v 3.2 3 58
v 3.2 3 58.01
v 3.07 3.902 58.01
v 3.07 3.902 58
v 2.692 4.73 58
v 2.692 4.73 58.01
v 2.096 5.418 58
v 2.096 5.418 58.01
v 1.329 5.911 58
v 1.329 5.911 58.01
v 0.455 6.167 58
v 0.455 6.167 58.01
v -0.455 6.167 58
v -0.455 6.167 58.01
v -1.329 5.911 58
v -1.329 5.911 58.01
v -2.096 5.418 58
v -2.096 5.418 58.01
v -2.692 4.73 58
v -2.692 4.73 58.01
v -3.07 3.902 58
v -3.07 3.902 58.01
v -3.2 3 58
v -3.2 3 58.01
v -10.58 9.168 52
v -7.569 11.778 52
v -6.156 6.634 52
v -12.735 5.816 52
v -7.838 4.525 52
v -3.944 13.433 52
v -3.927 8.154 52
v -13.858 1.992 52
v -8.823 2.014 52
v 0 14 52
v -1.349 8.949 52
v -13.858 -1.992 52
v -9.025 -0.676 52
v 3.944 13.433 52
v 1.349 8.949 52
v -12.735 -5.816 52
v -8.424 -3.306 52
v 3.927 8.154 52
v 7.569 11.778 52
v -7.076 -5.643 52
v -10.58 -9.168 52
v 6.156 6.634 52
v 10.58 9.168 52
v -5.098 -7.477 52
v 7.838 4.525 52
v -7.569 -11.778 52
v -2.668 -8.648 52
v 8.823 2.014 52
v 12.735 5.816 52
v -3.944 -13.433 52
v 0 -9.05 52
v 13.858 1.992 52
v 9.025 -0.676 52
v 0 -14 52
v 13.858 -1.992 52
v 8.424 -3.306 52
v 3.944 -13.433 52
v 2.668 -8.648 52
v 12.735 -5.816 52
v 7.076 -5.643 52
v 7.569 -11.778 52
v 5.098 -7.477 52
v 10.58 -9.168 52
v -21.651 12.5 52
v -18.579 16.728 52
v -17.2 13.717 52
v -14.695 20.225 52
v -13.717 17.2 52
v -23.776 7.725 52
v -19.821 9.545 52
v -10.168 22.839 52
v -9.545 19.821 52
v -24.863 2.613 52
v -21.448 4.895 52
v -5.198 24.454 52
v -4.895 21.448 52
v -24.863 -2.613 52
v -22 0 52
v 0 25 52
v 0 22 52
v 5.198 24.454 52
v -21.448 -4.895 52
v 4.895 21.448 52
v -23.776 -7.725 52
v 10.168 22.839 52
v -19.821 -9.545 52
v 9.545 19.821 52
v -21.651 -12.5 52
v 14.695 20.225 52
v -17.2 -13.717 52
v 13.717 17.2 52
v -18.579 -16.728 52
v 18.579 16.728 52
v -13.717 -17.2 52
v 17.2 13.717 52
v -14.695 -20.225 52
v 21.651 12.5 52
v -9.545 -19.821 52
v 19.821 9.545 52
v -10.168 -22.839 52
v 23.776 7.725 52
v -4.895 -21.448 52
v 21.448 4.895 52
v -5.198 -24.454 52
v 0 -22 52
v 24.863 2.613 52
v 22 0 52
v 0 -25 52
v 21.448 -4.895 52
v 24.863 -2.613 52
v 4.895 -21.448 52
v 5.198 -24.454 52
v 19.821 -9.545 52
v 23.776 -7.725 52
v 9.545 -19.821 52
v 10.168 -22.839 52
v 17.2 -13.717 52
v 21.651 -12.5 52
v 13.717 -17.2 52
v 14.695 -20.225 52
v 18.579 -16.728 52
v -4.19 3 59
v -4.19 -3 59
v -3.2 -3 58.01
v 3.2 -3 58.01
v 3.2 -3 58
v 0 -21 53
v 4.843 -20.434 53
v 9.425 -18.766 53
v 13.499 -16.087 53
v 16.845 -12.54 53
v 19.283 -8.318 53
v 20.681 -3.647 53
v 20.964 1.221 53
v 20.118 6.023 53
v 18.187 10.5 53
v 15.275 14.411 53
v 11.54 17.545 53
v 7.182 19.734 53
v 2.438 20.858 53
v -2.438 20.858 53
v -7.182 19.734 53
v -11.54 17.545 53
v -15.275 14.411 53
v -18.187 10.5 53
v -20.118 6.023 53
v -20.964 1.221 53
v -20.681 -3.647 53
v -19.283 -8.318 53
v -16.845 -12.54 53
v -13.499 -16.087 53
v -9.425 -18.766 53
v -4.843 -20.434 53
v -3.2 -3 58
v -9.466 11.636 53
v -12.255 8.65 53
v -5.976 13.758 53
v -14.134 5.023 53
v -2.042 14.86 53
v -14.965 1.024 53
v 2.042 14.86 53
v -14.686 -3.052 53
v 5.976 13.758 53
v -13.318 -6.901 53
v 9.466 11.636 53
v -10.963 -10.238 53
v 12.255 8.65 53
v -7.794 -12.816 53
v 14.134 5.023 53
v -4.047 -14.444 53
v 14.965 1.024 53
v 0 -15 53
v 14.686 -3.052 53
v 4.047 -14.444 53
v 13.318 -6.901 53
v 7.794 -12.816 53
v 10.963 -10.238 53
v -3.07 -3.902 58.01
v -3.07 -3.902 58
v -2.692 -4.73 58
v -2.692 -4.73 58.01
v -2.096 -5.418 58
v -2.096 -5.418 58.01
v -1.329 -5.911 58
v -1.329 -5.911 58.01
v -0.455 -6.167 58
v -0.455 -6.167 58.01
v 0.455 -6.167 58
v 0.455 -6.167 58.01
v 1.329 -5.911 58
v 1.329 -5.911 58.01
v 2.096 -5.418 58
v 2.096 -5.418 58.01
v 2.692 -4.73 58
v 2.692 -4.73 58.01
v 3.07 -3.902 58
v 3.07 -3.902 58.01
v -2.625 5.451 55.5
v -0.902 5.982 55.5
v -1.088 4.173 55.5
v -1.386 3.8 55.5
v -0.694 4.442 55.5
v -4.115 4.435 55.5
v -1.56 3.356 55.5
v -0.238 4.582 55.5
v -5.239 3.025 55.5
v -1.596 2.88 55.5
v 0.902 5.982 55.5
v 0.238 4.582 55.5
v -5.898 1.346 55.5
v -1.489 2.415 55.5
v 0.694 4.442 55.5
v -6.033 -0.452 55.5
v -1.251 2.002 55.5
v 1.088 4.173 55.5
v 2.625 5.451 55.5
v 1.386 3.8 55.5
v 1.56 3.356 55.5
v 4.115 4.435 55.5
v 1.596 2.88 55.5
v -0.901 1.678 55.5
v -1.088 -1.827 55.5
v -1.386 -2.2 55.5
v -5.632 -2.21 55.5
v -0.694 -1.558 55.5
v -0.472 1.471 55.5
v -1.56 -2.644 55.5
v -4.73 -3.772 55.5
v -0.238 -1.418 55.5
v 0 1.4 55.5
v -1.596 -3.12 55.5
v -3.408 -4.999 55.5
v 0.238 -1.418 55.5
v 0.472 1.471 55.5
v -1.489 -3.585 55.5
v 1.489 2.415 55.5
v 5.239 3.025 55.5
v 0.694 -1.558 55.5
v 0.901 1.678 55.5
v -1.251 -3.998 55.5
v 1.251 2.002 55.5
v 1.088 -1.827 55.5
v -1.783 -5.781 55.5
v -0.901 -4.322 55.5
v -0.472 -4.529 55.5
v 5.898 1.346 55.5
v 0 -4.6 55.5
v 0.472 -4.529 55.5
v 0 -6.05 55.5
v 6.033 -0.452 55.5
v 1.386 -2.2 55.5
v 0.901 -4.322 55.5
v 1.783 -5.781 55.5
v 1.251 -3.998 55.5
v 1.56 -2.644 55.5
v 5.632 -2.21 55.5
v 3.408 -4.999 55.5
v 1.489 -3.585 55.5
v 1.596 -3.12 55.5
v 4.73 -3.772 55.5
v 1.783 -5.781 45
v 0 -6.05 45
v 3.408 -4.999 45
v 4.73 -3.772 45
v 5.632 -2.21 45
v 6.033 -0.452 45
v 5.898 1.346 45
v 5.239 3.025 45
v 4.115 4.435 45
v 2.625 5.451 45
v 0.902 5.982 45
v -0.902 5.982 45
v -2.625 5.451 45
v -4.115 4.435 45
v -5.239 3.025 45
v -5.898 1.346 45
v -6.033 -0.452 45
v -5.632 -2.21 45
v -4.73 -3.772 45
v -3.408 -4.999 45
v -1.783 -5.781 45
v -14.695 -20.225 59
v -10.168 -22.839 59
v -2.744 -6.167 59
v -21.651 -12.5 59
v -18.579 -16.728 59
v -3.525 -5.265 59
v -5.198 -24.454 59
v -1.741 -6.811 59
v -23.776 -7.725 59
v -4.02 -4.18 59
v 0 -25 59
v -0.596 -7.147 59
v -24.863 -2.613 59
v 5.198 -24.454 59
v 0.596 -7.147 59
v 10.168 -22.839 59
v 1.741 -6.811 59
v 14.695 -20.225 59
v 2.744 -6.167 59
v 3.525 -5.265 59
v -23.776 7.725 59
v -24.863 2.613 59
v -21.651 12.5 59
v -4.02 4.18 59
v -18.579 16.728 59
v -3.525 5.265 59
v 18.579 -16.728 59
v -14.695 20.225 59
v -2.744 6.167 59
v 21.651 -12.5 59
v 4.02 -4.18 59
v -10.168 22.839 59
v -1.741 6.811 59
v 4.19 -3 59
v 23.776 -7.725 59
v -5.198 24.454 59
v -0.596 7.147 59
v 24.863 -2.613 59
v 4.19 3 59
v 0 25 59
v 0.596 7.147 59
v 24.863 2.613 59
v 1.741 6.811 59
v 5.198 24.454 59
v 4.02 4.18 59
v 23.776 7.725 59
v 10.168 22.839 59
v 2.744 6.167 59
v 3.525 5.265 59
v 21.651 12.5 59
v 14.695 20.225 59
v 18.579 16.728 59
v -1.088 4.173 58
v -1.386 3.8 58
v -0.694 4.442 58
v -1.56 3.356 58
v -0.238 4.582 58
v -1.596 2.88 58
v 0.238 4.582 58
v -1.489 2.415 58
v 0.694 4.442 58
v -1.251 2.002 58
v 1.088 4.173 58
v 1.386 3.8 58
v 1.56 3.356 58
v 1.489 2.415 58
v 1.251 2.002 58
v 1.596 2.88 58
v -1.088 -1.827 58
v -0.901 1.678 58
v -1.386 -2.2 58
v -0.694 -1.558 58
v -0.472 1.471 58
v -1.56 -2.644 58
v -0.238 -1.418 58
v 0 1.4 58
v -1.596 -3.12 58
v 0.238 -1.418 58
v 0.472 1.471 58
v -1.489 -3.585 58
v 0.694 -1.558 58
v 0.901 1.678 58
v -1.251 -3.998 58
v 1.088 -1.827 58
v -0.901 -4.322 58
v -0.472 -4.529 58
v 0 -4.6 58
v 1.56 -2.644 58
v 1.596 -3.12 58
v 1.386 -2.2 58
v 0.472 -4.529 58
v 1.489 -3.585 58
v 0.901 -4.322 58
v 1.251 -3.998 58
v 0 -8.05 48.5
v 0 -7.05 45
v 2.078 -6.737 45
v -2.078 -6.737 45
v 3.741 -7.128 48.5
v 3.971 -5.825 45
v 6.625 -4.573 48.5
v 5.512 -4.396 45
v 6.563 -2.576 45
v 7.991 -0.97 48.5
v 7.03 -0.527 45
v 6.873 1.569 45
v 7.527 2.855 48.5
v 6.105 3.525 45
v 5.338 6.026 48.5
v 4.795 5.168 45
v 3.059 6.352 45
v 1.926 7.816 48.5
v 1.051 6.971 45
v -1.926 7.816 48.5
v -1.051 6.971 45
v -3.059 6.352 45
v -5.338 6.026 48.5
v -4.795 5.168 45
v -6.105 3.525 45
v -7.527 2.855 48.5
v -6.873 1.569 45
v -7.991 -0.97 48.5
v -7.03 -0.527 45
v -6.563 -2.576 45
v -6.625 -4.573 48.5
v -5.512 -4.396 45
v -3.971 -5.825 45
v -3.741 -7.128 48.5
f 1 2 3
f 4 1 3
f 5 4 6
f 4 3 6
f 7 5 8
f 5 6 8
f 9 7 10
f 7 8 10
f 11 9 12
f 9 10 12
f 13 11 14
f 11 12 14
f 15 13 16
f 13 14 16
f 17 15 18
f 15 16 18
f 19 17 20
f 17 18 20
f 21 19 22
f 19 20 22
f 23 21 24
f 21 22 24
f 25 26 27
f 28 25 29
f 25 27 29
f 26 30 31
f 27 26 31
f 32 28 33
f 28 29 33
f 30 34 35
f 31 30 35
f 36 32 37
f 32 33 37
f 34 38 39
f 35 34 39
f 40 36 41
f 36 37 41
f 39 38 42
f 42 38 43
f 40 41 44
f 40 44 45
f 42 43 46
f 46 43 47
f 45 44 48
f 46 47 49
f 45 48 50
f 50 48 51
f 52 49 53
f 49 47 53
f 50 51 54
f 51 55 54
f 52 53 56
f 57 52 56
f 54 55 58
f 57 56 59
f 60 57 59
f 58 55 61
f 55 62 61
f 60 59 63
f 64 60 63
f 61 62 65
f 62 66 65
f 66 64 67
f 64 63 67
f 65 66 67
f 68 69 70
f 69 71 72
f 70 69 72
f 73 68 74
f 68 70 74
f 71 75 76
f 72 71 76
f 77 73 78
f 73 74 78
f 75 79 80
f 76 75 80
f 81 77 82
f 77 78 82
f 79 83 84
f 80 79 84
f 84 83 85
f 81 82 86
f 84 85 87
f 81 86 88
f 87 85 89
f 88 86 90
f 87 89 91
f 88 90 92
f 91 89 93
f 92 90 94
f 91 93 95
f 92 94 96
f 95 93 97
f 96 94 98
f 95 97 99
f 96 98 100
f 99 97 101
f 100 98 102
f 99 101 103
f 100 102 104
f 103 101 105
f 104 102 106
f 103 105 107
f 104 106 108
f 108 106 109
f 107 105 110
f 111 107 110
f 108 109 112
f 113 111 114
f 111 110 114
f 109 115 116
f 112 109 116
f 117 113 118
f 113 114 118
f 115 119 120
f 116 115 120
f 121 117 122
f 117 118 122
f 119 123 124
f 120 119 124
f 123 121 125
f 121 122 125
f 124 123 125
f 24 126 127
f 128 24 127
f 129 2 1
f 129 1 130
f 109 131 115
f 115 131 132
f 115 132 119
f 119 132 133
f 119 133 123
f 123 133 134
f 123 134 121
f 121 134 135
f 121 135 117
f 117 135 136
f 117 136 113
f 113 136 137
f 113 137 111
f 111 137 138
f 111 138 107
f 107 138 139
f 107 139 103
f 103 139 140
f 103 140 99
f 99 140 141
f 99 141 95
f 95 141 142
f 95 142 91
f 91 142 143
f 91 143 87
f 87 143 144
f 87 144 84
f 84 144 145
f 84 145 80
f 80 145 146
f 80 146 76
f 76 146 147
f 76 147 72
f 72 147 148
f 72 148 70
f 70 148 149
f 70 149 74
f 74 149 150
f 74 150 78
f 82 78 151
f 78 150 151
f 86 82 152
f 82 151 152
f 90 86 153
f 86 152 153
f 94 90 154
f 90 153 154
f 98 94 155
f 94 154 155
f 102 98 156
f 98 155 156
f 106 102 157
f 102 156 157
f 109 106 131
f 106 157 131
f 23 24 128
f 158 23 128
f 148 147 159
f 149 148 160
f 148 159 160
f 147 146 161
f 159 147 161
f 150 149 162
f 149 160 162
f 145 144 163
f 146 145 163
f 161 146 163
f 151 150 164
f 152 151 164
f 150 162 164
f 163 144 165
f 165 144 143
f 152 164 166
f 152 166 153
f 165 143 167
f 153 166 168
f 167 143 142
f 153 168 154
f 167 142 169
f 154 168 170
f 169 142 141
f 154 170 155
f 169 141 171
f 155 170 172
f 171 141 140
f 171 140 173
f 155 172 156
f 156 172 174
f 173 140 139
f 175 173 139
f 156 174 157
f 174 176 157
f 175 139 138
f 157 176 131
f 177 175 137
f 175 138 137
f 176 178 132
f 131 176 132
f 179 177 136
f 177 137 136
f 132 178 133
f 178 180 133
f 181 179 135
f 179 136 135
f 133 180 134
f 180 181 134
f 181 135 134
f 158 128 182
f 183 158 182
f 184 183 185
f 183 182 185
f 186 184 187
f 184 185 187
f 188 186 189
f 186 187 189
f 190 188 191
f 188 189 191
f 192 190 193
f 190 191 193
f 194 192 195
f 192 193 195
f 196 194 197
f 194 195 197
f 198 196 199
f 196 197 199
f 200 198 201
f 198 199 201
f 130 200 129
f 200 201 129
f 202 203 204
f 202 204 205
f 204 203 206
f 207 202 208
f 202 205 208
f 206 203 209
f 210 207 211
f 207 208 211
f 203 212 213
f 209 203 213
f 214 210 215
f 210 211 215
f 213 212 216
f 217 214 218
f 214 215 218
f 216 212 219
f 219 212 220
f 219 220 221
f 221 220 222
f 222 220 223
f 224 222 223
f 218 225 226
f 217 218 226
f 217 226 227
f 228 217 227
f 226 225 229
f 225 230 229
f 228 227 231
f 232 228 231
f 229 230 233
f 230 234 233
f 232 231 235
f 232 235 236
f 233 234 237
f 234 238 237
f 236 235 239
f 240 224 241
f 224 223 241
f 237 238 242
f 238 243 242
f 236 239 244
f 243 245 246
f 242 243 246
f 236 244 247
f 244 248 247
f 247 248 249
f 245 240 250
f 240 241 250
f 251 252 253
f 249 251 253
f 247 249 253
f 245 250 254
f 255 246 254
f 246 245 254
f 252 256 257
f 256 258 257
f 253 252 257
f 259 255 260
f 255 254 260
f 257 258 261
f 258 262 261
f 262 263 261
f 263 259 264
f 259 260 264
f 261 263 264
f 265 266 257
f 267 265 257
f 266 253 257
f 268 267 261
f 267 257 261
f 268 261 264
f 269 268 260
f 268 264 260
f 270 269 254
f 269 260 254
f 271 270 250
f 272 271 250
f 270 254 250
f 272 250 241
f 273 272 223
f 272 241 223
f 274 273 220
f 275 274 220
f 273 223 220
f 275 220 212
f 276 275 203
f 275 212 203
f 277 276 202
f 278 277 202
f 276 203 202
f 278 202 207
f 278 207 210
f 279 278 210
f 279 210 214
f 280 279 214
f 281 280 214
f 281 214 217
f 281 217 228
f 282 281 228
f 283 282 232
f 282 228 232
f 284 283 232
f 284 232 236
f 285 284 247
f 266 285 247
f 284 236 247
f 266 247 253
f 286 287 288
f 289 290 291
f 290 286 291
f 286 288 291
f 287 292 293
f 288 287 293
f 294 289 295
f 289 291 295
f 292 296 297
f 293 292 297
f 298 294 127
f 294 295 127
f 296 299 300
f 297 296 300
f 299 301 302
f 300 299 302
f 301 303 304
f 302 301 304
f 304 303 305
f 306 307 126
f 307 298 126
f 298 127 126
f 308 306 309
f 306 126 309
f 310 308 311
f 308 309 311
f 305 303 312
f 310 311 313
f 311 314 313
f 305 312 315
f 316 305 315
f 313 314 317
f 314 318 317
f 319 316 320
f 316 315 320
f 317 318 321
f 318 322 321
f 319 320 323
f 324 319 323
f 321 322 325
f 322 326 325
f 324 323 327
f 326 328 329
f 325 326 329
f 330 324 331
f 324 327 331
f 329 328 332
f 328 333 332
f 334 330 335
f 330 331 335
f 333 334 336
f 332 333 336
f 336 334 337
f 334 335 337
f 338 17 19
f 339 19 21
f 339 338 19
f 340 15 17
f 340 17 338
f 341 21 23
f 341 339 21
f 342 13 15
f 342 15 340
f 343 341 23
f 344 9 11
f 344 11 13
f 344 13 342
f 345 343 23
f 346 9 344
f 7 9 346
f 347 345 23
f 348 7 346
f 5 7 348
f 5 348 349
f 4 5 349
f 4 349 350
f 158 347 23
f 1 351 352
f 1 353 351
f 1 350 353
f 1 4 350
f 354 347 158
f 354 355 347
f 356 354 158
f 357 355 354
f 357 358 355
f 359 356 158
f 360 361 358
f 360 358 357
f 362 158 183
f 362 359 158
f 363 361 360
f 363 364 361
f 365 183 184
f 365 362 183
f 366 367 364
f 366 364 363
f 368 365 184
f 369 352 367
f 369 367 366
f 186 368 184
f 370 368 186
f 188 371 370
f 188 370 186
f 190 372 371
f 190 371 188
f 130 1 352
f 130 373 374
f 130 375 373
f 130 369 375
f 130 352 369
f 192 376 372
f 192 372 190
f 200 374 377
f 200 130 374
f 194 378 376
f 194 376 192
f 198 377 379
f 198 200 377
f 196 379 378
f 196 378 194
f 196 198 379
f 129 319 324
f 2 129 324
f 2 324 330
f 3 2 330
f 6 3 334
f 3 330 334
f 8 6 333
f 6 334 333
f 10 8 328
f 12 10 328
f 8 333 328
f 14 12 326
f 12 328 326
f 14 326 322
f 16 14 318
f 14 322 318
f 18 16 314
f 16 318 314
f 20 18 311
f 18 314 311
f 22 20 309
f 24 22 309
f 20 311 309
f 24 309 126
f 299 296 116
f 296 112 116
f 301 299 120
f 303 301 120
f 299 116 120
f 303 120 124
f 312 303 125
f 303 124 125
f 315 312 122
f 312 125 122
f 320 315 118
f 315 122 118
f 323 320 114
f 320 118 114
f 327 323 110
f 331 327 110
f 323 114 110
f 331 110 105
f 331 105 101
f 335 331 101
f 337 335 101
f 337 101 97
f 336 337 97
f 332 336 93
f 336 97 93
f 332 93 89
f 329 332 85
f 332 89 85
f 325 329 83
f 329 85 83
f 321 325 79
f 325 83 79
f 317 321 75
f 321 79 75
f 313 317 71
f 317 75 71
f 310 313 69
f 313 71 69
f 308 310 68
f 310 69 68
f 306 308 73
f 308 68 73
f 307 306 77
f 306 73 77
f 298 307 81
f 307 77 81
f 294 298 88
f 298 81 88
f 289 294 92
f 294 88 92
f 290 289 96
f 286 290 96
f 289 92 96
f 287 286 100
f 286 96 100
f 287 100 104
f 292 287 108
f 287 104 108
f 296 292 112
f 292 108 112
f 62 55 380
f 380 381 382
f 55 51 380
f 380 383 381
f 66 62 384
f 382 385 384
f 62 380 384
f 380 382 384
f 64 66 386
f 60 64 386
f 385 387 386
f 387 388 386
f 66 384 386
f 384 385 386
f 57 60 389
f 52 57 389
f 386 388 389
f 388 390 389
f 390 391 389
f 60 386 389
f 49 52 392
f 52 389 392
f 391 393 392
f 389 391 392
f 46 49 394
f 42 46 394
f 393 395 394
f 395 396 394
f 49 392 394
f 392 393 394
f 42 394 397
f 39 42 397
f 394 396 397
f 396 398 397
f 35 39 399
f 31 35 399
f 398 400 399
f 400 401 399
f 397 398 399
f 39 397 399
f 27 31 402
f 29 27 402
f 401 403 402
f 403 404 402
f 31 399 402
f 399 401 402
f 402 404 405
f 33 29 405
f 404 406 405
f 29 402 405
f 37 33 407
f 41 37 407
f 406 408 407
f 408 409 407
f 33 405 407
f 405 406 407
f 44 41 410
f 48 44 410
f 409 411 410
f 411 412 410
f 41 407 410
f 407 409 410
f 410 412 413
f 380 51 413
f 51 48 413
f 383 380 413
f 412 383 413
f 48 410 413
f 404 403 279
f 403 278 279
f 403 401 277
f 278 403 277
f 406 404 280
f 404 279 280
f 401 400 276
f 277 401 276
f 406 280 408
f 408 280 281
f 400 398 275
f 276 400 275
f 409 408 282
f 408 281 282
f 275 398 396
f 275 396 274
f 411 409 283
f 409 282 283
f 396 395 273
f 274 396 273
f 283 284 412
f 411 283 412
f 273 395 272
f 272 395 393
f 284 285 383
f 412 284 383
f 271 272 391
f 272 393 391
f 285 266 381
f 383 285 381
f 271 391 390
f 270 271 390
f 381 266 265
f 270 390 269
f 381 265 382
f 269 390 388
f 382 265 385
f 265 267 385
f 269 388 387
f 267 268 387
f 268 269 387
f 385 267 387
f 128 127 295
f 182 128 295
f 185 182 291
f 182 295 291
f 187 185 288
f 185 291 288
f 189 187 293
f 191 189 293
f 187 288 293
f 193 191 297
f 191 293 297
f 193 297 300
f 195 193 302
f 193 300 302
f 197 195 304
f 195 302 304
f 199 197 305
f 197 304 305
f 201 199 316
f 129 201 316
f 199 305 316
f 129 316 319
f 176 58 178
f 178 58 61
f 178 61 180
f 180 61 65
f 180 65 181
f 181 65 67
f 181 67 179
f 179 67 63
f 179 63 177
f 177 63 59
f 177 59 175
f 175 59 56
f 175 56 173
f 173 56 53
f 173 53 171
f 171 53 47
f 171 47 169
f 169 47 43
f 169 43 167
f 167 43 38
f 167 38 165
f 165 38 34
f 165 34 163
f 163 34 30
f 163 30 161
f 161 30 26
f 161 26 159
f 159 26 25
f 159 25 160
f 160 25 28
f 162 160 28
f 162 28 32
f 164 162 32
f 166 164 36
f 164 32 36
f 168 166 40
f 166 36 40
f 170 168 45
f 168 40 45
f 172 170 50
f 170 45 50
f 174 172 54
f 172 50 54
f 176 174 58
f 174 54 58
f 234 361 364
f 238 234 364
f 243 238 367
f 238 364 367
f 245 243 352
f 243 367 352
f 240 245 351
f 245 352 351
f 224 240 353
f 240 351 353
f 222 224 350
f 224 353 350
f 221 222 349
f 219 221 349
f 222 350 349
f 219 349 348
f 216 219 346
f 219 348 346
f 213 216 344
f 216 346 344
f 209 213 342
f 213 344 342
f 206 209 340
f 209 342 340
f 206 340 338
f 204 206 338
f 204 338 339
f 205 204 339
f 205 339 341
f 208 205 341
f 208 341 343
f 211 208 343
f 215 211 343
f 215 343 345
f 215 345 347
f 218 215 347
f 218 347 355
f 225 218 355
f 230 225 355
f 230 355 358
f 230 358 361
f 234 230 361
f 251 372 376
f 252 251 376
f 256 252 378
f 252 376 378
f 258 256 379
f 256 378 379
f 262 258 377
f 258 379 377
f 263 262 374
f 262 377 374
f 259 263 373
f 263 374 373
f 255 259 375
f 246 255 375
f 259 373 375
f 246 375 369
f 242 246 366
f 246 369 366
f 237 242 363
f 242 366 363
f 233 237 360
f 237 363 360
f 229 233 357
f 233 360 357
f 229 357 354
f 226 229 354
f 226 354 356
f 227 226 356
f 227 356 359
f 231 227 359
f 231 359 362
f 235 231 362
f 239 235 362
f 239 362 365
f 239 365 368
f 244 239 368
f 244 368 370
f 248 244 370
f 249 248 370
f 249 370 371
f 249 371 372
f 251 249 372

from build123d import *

# Parameters (mm, degrees)
SKETCH044_R        = 1.6
POCKET029_DEPTH    = 14.001
POCKET030_DEPTH    = 1
CHAMFER026025_SIZE = 0.99


with BuildPart() as part:
    # Sketch043 → Revolution001 (revolve)
    with BuildSketch(Plane.YZ):
        Polygon((-6.05, 0), (-6.05, 10.5), (0, 10.5), (0, 14), (-25, 14), (-25, 7), (-22, 7), (-21, 8), (-15, 8), (-14, 7), (-9.05, 7), (-7.05, 0), align=None)
    revolve(axis=Axis((0, 0, 0), (0, 0, 1)))

    # Sketch044 (on Face3 of Revolution001) → Pocket029 (cut, through all)
    with BuildSketch(Plane(origin=(0, 0, 14), x_dir=(0, -1, 0), z_dir=(0, 0, 1))):
        with Locations((-3, 0)):
            Circle(SKETCH044_R)
        with Locations((3, 0)):
            Circle(SKETCH044_R)
    extrude(amount=-POCKET029_DEPTH, mode=Mode.SUBTRACT)

    # Sketch045 (on Face8 of Pocket029) → Pocket030 (cut)
    with BuildSketch(Plane(origin=(0, 0, 14), x_dir=(0, -1, 0), z_dir=(0, 0, 1))):
        with BuildLine():
            ThreePointArc((-3, 3.2), (-6.2, 0), (-3, -3.2))
            Line((-3, -3.2), (3, -3.2))
            ThreePointArc((3, -3.2), (6.2, 0), (3, 3.2))
            Line((-3, 3.2), (3, 3.2))
        make_face()
    extrude(amount=-POCKET030_DEPTH, mode=Mode.SUBTRACT)

    # Chamfer026025
    chamfer026025_edges = [part.edges().sort_by_distance(p)[0] for p in [
        (0, -6.2, 14),
        (-3.2, 0, 14),
        (0, 6.2, 14),
        (3.2, 0, 14),
    ]]
    chamfer(chamfer026025_edges, length=CHAMFER026025_SIZE)


with BuildPart() as part_1:
    # Body001001001002003010002 placement: moved
    add(part.part.moved(Location((0, 0, 45))))


solid = part_1.part
